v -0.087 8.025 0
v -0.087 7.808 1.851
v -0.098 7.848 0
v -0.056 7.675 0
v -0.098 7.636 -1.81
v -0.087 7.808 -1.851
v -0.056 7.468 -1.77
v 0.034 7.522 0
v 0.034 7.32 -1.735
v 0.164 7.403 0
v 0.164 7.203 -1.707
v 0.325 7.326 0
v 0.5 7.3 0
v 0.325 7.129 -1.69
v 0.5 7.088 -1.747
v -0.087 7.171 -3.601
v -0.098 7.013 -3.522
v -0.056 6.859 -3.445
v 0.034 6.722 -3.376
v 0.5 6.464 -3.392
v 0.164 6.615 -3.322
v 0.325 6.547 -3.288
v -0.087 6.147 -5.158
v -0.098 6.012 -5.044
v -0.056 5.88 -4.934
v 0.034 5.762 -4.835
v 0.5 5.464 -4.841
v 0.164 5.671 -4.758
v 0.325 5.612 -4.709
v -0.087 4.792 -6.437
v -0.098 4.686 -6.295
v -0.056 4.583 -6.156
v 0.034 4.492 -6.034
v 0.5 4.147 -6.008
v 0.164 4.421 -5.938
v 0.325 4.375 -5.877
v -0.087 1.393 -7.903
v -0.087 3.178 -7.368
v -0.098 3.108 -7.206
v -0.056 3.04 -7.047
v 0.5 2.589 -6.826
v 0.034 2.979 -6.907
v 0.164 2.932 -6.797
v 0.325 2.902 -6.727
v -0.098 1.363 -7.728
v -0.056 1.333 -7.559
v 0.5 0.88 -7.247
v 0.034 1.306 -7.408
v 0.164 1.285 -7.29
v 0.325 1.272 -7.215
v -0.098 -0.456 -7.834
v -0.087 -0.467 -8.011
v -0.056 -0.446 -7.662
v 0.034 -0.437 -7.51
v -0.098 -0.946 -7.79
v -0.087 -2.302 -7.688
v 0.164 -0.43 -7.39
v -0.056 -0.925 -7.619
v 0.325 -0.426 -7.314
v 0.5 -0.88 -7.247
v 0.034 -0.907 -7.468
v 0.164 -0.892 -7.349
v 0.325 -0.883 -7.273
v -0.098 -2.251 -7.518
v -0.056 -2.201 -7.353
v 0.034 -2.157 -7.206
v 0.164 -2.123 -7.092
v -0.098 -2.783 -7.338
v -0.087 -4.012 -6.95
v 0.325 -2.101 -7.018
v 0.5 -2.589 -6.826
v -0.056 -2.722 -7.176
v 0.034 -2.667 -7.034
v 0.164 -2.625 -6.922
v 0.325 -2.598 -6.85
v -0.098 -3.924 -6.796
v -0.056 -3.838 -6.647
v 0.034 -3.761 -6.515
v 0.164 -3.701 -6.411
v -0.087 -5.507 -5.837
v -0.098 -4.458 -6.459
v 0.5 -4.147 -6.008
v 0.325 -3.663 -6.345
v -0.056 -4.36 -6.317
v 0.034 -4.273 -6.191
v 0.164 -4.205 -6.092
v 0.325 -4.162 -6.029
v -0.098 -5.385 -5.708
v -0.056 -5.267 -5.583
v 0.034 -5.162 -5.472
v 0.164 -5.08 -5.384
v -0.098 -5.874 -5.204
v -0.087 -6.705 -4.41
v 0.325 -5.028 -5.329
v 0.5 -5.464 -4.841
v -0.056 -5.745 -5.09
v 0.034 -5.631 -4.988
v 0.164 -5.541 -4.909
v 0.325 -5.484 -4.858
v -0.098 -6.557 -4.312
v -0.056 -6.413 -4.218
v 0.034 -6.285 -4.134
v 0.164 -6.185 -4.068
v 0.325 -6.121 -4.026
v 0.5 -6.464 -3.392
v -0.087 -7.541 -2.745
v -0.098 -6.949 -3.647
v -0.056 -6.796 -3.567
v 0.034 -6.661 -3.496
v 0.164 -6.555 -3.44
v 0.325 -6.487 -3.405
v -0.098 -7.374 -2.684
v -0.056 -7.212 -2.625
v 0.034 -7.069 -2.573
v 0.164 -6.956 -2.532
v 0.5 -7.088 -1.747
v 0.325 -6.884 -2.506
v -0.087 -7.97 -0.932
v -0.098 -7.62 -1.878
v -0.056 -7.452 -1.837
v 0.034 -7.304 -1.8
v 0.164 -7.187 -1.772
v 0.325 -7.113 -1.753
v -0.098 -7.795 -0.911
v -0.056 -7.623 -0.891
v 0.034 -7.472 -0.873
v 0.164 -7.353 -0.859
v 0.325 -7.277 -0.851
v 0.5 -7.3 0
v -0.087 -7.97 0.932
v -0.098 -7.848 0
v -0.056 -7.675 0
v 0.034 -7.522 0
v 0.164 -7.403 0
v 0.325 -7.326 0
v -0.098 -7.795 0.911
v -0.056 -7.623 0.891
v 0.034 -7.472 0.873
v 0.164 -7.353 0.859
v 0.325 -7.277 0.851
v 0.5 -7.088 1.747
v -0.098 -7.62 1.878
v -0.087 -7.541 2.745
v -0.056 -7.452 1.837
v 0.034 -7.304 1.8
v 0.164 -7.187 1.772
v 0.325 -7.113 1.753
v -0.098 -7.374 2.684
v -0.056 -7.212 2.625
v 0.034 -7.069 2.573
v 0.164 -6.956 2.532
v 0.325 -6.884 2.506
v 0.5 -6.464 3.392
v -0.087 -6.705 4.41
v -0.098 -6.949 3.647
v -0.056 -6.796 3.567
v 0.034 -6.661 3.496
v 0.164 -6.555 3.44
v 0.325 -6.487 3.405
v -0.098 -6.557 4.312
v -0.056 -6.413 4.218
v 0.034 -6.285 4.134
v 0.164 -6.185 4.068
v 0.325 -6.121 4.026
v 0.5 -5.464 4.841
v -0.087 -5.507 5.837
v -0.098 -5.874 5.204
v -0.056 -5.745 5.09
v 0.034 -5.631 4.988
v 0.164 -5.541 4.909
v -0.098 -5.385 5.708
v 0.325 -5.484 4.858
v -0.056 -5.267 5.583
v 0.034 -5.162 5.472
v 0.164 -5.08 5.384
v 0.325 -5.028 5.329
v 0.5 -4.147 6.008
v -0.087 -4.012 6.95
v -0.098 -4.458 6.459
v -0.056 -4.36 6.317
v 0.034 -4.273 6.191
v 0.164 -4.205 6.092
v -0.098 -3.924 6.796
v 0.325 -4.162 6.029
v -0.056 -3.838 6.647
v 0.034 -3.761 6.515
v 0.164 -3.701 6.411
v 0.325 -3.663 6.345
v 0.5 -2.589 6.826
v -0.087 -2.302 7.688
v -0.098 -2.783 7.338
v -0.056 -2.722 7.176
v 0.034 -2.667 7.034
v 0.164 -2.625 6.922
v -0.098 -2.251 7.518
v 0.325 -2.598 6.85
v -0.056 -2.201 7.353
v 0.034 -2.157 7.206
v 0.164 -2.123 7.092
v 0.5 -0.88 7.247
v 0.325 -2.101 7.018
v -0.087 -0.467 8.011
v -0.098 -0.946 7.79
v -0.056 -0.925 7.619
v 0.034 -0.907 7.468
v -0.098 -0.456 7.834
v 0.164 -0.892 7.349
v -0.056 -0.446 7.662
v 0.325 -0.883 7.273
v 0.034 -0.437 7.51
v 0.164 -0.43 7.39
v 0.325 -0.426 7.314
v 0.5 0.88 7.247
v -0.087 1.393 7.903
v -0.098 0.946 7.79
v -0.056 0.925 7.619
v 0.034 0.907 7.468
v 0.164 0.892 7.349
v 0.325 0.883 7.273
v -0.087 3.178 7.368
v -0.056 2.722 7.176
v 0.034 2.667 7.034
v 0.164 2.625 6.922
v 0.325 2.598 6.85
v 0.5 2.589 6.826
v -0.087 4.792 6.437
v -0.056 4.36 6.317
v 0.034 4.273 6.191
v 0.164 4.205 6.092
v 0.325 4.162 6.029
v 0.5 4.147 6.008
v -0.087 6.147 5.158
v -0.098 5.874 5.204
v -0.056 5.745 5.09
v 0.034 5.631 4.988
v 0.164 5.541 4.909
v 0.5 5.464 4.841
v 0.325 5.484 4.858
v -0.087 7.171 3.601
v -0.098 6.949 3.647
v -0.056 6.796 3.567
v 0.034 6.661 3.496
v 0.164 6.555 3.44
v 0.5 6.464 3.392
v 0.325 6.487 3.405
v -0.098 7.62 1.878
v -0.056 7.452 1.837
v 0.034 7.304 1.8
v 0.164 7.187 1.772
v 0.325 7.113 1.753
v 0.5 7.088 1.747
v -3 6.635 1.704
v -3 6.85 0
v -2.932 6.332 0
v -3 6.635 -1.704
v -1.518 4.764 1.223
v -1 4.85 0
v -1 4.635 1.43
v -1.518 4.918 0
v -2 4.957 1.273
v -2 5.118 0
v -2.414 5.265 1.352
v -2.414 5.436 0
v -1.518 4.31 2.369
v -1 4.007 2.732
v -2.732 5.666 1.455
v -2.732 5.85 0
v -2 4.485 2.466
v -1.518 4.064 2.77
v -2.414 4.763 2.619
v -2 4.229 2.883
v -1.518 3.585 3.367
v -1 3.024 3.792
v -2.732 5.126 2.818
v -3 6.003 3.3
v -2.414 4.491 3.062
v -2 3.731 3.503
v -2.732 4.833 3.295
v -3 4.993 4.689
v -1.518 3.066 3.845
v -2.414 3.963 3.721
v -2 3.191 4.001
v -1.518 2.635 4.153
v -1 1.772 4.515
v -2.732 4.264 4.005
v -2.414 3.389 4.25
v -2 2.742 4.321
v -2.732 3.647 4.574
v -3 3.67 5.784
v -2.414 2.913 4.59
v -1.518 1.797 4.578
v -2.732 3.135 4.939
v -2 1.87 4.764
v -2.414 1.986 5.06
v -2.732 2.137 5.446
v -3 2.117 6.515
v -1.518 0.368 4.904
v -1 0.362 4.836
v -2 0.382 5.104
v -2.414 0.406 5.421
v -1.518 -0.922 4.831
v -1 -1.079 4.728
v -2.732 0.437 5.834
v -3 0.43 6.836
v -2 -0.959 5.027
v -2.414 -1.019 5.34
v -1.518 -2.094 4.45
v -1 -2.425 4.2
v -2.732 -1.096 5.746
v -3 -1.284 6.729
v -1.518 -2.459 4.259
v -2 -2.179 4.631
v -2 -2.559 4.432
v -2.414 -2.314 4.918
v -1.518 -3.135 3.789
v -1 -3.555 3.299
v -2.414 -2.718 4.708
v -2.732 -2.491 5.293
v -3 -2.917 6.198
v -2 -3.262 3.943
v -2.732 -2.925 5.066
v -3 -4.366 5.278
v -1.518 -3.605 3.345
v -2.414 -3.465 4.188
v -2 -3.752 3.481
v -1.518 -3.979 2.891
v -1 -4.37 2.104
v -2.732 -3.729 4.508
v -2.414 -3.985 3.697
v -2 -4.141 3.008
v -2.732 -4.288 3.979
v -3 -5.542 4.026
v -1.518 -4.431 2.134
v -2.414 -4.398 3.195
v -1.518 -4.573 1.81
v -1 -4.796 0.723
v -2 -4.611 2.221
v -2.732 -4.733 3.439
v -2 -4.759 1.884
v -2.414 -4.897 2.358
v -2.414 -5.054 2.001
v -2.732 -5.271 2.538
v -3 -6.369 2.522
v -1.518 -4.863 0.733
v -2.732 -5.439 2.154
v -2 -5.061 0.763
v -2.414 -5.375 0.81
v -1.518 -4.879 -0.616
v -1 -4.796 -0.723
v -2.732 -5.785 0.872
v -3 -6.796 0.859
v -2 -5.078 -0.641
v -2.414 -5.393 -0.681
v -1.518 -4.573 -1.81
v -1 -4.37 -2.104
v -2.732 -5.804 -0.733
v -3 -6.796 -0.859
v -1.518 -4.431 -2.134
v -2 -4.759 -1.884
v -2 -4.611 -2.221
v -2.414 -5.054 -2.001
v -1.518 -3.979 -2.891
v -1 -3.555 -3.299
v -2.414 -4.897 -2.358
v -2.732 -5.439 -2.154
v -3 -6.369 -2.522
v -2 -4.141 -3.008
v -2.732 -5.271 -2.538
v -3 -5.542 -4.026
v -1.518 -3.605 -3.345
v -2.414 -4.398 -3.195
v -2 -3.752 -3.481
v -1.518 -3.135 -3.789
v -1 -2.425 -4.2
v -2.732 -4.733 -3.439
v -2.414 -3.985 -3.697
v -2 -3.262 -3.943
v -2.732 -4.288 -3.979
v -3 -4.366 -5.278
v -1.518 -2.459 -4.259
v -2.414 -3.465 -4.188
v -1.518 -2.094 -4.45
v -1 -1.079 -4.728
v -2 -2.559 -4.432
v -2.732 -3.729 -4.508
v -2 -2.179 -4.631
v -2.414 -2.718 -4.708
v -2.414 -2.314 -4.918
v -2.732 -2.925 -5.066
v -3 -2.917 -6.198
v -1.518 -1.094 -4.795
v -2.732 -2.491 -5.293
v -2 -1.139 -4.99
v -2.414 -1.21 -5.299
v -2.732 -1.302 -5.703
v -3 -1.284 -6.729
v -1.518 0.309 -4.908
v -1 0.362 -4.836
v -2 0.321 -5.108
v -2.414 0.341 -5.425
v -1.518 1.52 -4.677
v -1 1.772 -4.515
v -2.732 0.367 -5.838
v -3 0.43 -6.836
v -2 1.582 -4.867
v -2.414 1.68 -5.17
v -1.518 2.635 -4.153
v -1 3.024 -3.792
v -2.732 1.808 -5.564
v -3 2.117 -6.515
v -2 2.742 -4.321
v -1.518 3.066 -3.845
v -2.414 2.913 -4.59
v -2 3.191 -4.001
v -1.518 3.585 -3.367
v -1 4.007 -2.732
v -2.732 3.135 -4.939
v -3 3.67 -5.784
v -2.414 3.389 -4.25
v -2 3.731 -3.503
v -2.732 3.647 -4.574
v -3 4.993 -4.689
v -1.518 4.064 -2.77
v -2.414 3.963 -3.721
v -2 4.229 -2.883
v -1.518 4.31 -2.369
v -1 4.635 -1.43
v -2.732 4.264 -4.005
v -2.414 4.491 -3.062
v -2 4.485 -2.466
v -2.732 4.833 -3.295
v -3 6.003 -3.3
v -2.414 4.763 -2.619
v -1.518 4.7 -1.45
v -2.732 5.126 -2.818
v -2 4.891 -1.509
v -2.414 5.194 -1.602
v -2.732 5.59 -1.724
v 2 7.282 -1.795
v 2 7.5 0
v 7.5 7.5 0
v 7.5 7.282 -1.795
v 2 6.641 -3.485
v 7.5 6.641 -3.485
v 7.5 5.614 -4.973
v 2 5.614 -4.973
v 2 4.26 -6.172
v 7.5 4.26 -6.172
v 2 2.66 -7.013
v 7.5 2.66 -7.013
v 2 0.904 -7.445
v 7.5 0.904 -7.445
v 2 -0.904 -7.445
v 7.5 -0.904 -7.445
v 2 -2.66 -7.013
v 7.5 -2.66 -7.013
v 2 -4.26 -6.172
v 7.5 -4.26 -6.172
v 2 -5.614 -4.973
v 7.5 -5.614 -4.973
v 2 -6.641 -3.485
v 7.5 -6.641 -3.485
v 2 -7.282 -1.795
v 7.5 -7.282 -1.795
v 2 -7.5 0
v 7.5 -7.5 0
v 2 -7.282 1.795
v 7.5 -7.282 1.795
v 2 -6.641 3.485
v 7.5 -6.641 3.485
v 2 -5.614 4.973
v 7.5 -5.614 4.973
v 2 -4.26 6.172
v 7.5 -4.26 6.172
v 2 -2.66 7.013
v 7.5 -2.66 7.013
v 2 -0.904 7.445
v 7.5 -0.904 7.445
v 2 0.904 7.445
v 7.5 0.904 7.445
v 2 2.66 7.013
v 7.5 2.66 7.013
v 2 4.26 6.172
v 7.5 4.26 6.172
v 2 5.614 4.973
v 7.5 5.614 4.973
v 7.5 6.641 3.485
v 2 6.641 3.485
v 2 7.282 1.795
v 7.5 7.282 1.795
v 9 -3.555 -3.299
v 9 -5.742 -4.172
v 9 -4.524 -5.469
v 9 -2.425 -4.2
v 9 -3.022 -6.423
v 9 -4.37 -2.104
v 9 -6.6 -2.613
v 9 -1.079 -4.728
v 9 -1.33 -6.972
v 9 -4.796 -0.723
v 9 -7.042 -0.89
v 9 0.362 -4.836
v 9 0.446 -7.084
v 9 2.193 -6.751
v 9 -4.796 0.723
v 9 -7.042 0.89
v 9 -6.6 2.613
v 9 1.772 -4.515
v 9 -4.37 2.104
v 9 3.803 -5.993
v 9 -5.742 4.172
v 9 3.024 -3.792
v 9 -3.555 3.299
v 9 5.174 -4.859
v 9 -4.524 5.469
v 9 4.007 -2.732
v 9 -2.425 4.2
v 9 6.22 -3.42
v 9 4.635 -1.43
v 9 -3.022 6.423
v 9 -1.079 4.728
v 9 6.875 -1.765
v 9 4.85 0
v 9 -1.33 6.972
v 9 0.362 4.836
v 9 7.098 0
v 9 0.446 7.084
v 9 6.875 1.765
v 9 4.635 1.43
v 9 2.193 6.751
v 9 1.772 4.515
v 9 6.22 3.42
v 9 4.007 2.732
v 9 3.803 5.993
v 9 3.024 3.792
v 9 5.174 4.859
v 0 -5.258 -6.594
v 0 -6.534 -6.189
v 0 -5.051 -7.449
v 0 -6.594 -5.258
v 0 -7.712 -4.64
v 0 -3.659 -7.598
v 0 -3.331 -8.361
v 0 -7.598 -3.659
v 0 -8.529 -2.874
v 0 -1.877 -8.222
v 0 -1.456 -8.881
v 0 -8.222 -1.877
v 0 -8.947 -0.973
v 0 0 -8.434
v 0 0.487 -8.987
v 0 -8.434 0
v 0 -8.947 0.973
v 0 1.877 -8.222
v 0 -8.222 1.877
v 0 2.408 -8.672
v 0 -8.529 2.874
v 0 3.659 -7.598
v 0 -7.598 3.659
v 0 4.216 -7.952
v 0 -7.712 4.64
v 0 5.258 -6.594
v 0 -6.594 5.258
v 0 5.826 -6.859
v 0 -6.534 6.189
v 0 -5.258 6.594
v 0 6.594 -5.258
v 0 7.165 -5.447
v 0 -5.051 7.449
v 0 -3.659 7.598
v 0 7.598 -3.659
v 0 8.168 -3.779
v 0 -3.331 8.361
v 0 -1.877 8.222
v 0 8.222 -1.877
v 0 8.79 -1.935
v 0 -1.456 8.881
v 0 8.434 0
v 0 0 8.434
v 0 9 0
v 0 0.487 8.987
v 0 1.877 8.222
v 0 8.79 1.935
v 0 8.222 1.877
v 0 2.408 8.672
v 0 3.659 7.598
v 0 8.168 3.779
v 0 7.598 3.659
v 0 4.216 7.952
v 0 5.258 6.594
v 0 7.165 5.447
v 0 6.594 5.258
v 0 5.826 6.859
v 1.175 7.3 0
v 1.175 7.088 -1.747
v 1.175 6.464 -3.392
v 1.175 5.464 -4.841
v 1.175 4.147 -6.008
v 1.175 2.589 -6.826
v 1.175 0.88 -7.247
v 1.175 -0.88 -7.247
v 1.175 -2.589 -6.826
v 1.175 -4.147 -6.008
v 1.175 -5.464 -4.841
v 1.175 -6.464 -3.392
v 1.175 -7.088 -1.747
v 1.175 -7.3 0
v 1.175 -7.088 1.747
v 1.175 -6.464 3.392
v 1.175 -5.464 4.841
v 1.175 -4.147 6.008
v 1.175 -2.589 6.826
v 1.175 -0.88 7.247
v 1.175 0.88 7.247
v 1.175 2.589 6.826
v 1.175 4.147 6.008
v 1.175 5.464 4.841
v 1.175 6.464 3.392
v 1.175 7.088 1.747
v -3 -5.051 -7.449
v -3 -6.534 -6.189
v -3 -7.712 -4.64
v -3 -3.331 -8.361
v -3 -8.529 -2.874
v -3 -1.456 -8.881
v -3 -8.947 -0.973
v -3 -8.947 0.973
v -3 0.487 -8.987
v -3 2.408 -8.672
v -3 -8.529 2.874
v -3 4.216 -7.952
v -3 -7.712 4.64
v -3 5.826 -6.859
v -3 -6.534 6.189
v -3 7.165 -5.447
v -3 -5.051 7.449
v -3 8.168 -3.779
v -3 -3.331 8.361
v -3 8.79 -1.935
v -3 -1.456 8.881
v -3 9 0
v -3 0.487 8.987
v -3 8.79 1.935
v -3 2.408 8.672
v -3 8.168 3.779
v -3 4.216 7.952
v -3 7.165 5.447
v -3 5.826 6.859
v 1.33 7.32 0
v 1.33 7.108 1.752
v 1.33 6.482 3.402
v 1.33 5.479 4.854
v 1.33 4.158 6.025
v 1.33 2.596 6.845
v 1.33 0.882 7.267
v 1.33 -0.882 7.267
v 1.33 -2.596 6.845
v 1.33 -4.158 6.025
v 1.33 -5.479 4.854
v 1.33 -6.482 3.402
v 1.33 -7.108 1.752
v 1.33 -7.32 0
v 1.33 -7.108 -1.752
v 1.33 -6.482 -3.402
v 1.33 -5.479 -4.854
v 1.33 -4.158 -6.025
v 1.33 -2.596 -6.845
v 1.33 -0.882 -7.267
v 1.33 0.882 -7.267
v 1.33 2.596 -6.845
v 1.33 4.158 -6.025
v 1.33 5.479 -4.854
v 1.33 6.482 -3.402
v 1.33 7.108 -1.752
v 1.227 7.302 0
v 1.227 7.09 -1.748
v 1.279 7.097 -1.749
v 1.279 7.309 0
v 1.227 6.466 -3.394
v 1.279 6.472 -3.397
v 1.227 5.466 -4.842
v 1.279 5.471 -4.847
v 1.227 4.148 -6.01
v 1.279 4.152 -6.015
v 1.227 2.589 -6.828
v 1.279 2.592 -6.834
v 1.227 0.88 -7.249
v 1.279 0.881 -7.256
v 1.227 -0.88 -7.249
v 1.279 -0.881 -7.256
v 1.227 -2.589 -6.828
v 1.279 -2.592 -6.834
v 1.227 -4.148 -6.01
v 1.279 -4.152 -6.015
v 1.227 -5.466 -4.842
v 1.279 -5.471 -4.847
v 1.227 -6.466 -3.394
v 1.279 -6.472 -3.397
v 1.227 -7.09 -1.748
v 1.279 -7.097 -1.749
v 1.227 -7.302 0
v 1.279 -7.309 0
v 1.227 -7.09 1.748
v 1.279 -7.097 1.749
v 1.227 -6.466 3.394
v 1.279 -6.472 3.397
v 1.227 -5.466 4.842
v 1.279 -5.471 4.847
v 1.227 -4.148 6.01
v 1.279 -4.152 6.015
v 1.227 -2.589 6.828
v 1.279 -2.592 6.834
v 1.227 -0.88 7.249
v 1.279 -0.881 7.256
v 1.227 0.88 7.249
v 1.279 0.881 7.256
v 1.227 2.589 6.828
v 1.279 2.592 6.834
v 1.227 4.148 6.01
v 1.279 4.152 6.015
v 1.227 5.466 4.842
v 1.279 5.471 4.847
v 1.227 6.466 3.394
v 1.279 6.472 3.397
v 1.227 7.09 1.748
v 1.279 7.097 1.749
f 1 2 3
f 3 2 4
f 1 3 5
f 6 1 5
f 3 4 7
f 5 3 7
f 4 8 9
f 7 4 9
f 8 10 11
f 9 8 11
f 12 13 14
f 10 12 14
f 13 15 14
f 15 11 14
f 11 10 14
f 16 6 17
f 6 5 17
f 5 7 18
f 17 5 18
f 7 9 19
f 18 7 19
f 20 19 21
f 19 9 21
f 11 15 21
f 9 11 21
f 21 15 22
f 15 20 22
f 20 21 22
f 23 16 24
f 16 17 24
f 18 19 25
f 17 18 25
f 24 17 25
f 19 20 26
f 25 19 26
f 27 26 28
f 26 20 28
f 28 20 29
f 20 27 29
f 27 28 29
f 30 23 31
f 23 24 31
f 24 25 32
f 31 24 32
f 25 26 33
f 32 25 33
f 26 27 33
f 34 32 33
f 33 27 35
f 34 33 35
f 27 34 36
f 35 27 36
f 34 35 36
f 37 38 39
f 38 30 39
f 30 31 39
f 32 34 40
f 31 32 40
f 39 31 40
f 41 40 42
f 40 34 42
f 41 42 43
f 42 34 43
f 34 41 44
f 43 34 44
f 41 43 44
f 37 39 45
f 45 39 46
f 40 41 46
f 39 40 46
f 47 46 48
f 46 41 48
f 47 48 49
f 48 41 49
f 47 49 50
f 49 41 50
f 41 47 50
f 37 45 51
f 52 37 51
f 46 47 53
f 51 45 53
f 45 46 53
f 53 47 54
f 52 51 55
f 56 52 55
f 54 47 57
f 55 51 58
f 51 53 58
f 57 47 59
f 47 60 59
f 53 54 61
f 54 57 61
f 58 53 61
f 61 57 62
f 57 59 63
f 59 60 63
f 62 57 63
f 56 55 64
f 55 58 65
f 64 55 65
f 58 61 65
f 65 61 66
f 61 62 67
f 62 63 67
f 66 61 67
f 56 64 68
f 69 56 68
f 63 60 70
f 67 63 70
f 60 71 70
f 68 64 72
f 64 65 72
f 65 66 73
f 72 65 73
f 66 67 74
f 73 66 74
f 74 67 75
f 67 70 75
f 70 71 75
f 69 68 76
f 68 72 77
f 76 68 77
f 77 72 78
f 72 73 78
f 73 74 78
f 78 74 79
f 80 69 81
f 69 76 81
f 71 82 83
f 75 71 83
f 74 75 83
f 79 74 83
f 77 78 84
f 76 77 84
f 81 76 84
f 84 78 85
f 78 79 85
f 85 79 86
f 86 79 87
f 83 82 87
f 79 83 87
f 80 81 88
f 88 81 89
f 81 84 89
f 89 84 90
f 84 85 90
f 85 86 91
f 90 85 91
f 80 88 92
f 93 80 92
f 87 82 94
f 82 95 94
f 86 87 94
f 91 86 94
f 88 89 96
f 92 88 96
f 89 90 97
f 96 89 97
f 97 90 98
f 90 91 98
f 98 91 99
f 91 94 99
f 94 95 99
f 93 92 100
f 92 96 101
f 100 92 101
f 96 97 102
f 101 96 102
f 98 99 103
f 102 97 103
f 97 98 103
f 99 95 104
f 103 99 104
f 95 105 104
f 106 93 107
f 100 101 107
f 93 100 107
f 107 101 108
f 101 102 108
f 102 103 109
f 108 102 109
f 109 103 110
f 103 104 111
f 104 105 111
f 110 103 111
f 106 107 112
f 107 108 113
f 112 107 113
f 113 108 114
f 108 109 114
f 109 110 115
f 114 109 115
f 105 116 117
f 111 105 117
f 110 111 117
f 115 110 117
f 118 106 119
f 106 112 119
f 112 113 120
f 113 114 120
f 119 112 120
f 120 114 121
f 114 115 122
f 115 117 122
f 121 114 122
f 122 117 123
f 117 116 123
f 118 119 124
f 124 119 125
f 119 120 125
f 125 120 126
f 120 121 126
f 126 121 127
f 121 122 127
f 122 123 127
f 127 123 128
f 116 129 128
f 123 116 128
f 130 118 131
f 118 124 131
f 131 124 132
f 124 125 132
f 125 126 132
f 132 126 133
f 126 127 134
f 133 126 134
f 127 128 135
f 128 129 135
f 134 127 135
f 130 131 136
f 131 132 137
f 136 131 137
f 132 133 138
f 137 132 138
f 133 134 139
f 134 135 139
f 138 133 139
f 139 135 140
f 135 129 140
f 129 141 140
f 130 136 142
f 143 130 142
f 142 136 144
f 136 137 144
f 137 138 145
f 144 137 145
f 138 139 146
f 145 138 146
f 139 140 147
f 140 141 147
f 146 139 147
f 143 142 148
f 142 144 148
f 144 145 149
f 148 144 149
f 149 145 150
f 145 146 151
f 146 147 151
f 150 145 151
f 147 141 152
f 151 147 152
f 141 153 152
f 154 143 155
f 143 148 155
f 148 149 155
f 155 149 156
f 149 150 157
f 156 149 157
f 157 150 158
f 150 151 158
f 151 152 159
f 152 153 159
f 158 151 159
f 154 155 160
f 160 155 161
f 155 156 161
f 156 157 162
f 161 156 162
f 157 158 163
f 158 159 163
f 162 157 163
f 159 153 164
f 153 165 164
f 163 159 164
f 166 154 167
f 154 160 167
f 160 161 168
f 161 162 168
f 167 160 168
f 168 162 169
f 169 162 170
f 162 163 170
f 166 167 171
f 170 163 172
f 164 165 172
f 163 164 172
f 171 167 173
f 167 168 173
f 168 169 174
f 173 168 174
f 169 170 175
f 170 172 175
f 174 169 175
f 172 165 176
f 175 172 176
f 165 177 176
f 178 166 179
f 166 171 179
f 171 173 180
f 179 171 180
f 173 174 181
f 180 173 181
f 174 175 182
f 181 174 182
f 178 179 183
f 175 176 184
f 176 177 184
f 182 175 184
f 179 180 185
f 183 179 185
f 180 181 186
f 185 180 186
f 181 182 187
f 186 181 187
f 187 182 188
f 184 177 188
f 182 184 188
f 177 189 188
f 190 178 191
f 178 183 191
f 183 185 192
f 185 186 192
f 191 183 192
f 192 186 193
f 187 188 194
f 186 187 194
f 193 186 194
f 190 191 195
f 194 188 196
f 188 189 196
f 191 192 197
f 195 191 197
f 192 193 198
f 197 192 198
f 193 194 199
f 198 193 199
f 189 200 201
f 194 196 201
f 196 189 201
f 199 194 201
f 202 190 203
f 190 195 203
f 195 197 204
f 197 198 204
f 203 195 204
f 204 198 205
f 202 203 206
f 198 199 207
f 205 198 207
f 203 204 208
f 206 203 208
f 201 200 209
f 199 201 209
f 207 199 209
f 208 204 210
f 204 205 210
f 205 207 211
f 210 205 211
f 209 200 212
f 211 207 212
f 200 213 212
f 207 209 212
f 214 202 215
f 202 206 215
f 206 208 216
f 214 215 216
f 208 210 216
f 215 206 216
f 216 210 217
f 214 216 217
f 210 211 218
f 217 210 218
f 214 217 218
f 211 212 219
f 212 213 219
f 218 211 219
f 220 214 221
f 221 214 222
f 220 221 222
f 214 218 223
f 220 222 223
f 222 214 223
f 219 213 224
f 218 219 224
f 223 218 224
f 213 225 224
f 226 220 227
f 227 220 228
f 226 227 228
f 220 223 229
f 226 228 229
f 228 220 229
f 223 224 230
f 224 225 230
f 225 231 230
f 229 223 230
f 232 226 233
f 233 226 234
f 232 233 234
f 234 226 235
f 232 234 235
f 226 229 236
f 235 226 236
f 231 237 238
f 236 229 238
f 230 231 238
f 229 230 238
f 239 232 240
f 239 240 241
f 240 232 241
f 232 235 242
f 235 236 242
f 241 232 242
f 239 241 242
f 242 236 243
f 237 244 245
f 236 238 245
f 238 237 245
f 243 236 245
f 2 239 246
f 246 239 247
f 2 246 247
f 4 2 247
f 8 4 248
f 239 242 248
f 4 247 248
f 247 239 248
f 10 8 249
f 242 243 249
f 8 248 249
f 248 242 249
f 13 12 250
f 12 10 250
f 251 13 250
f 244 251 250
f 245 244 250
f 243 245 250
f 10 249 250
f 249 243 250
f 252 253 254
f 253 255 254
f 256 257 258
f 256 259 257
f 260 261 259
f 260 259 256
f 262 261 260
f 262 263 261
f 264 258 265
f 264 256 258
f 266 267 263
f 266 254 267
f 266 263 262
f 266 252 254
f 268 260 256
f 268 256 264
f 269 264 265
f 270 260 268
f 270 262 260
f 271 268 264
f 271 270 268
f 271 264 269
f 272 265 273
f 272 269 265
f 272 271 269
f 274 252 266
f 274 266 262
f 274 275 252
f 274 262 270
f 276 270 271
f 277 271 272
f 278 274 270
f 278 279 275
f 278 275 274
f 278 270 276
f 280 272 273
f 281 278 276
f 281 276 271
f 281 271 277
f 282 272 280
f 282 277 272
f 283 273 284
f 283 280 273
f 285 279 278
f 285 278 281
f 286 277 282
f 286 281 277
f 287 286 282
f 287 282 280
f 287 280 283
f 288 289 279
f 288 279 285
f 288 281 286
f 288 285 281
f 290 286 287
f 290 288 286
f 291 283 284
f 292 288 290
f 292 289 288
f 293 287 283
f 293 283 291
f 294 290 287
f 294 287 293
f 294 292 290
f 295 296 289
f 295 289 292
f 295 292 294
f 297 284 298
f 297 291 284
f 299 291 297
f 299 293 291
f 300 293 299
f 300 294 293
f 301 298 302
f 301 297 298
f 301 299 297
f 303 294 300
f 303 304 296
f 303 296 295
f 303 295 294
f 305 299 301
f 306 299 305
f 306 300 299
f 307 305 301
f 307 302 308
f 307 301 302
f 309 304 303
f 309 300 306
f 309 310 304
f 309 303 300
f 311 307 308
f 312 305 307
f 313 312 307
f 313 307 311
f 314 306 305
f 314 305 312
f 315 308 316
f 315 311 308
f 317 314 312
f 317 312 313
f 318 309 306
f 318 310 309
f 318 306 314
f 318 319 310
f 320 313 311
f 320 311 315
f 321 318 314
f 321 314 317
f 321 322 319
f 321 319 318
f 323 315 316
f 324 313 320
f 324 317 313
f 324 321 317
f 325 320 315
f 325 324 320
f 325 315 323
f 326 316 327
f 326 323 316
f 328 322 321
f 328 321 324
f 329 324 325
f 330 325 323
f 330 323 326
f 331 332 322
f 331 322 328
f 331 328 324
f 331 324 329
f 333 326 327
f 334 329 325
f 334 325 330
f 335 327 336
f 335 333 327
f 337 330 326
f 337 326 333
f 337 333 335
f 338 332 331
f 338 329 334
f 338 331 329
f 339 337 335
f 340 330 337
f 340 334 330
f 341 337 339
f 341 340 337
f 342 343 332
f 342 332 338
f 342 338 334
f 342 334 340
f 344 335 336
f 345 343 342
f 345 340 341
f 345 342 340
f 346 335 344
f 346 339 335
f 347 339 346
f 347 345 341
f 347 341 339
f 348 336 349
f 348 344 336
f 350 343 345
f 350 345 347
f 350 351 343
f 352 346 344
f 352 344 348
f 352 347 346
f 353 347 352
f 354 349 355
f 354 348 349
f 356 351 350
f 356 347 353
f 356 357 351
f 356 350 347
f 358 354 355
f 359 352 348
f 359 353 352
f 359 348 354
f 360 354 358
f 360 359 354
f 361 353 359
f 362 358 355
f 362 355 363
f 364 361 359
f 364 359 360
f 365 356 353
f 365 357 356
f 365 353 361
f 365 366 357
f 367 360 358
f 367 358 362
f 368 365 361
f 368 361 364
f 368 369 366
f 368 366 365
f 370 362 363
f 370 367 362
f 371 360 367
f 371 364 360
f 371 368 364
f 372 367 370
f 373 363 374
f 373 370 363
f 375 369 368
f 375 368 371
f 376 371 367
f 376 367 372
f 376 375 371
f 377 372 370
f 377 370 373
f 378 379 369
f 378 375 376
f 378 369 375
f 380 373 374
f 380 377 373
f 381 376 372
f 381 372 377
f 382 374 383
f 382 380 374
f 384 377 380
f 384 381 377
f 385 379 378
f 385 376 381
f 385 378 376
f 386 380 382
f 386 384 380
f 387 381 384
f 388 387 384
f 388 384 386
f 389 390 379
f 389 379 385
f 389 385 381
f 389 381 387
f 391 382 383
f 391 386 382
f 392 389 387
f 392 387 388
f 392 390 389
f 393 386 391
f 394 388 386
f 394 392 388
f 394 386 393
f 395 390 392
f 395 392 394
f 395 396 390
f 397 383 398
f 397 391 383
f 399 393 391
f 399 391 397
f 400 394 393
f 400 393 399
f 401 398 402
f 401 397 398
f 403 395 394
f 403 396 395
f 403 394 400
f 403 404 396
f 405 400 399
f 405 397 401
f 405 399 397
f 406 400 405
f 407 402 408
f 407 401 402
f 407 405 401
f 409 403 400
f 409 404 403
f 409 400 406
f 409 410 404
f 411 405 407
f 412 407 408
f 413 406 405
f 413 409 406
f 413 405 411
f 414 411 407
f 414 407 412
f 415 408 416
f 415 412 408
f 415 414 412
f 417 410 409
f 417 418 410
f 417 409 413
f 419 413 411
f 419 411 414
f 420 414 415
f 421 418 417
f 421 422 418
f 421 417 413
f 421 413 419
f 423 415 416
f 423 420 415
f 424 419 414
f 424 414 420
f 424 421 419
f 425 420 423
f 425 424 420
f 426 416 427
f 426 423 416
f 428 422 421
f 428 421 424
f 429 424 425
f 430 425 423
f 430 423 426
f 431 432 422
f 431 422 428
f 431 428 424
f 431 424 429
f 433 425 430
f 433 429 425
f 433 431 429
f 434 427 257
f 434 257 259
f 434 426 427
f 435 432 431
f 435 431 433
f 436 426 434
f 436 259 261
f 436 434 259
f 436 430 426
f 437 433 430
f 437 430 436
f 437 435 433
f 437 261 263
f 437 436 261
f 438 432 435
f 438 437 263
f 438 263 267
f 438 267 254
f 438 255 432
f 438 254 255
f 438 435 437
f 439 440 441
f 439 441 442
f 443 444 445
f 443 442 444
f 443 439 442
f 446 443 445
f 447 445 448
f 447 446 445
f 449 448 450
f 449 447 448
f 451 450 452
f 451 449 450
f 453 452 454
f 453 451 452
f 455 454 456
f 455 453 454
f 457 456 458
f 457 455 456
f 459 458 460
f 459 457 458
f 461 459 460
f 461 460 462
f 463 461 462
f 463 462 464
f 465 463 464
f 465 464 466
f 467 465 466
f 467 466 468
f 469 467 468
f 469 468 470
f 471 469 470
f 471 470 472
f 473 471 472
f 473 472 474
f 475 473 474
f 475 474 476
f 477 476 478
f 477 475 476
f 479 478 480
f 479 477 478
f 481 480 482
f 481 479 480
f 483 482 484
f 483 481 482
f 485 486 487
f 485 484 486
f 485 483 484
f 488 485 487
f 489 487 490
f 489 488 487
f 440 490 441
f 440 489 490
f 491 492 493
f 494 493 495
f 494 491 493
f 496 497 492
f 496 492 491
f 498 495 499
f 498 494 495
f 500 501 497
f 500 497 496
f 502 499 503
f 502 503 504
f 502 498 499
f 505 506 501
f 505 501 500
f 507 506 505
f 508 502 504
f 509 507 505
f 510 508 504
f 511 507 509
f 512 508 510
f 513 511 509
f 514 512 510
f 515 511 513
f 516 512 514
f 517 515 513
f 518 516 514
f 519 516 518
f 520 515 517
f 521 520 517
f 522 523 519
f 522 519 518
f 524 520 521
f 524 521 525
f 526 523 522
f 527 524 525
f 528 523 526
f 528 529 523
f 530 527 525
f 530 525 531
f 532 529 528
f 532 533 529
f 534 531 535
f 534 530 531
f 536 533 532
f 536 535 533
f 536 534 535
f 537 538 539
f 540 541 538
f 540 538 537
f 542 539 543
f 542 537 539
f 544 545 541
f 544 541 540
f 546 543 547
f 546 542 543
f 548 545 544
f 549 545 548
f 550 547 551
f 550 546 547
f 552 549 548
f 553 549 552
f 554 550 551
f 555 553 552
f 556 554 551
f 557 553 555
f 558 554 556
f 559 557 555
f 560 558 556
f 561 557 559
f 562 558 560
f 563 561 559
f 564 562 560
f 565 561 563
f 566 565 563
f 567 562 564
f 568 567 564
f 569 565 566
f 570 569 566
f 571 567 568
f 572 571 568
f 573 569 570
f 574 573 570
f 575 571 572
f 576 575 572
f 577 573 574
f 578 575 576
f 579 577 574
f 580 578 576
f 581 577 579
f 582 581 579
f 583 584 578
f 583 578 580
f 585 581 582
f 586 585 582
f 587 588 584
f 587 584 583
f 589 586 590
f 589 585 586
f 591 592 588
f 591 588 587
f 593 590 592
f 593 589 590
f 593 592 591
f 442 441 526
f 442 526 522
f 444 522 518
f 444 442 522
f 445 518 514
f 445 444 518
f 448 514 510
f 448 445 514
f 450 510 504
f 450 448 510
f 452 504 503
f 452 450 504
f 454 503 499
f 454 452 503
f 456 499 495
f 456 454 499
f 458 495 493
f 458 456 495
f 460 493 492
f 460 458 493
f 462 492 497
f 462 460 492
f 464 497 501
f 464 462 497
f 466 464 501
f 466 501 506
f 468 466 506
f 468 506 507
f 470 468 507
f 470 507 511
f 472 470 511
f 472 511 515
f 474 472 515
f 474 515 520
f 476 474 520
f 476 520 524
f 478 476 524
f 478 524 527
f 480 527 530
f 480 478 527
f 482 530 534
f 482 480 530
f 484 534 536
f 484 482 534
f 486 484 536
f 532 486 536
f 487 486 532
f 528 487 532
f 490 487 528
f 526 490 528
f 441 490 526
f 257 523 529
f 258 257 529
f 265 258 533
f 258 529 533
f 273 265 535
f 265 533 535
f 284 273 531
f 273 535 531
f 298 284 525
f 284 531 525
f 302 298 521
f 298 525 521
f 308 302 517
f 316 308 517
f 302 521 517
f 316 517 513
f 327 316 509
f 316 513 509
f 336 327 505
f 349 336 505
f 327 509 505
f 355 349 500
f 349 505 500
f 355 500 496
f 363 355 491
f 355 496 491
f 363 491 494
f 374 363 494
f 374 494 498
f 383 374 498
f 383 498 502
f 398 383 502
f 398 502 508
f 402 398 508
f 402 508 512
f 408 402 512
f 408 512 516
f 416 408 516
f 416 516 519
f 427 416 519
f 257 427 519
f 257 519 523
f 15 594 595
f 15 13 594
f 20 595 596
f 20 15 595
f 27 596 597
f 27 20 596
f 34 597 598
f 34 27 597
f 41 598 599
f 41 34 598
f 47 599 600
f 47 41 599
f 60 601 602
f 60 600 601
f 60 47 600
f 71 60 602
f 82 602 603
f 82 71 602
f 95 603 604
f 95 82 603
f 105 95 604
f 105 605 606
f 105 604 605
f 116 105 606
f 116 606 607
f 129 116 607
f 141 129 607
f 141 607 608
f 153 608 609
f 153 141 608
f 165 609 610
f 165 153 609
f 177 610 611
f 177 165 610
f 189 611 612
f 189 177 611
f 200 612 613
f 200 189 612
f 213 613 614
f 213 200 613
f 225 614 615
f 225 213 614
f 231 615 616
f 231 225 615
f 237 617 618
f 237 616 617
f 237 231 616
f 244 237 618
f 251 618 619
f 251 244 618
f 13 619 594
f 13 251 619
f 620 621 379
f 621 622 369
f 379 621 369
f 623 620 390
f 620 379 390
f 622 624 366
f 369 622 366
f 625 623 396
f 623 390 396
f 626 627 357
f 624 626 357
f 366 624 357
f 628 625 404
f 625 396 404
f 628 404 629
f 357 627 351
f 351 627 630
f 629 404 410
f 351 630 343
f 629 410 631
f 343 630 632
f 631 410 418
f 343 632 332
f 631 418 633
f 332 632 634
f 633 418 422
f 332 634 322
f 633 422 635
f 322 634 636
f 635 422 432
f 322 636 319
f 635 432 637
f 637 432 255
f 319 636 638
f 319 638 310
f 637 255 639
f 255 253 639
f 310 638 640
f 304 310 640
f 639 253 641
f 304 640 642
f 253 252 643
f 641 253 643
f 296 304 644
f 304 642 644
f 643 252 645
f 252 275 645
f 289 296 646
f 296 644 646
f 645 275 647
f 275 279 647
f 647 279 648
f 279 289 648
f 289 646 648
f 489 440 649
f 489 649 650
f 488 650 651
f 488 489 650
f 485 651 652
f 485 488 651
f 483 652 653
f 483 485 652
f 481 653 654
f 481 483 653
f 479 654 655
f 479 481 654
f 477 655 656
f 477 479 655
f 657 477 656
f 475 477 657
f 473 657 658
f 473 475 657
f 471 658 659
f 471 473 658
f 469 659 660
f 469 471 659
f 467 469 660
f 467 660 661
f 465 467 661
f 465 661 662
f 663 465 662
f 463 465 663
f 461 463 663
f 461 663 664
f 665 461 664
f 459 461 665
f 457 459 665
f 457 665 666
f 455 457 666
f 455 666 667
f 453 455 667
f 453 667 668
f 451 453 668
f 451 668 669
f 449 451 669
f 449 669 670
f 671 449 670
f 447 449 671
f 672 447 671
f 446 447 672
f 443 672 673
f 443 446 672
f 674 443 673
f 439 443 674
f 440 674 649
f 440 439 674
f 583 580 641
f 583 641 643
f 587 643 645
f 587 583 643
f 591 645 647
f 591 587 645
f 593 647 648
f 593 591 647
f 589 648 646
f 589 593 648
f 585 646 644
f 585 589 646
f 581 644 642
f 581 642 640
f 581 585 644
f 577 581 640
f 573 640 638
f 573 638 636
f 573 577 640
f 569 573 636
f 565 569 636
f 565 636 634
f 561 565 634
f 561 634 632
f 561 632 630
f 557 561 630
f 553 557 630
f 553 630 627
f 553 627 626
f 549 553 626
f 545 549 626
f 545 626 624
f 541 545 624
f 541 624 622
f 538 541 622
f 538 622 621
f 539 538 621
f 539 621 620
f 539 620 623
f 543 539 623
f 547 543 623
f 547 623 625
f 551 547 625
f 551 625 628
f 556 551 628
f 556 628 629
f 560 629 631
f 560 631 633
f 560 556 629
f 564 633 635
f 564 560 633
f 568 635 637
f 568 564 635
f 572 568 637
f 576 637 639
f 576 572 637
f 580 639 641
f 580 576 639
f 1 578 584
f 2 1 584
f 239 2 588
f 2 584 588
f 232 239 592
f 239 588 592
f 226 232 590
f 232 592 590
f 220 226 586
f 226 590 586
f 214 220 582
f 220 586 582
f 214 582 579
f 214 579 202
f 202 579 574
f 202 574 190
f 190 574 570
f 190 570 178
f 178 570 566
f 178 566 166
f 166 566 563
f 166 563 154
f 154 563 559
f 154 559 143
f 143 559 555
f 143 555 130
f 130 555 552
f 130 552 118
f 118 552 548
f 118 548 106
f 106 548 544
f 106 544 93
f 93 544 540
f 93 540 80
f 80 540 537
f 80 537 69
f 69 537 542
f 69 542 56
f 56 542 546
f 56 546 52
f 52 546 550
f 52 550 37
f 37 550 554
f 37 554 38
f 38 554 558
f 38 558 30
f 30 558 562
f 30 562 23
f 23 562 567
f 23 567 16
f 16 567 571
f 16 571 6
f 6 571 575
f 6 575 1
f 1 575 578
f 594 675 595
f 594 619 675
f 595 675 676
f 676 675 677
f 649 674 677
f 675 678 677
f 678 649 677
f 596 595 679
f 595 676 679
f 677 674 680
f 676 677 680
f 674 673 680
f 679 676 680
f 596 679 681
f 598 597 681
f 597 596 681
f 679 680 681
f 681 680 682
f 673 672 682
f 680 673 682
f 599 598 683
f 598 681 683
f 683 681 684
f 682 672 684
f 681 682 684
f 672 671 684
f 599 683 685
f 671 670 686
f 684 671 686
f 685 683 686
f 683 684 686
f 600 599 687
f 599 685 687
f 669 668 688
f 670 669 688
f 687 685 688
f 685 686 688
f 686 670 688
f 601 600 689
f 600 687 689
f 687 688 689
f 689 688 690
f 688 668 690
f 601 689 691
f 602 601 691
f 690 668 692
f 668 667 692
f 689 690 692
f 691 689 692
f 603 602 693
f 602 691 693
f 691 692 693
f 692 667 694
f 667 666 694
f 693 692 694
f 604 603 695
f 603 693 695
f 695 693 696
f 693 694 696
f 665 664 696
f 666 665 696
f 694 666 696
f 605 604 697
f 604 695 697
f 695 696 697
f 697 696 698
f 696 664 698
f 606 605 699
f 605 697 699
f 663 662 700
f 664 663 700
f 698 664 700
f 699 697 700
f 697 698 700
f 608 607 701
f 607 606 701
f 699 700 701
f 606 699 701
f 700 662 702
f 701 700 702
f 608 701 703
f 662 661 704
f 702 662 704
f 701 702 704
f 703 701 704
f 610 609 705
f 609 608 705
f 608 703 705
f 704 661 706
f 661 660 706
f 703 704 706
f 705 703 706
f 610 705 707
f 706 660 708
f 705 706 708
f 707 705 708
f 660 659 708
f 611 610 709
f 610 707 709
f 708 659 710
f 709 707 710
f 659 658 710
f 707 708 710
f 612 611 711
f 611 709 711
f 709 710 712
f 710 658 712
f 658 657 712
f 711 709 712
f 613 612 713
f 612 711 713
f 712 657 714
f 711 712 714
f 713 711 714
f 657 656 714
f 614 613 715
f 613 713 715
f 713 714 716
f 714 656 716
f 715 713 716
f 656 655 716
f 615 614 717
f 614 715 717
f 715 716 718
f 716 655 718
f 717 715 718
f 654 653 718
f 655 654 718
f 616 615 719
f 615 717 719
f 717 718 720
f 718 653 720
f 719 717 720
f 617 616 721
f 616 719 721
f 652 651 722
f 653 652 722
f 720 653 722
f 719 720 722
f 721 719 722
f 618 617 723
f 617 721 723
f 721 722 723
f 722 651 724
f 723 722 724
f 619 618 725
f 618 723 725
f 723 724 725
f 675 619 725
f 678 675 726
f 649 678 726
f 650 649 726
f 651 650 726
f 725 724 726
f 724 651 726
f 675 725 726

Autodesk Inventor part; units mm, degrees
ref_plane "YZ Plane" through (0, 0, 0) normal (1, 0, 0) x (0, 1, 0)
ref_plane "XZ Plane" through (0, 0, 0) normal (0, 1, 0) x (-1, 0, 0)
ref_plane "XY Plane" through (0, 0, 0) normal (0, 0, 1) x (1, 0, 0)
sketch "Skizze1" plane through (0, 0, 0) normal (0, 0, 1) x (1, 0, 0)
  line L0 (-2.5, 0) -> (5.5, 0)
  line L1 (9, 4.85) -> (9, 7.5)
  line L2 (9, 7.5) -> (2, 7.5)
  line L3 (-3, 4.85) -> (-3, 9)
  line L4 (-3, 9) -> (0, 9)
  line L5 (2, 7.5) -> (1.3299, 7.3204)
  line L6 (1.1746, 7.3) -> (0.5, 7.3)
  line L7 (-0.0869, 8.0247) -> (0, 8.4335)
  line L8 (0, 8.4335) -> (0, 9)
  arc A0 (-0.0869, 8.0247) -> (0.5, 7.3) centre (0.5, 7.9) ccw
  arc A1 (1.1746, 7.3) -> (1.3299, 7.3204) centre (1.1746, 7.9) ccw
  line L9 (-28.4, 0) -> (128.4, 0) projected
  line L10 (0, -12) -> (0, 72) projected
  line L11 (-3, 4.85) -> (9, 4.85)
  dimension "d0" = 18
  dimension "d1" = 15
  dimension "d2" = 12
  dimension "d3" = 12
  dimension "d4" = 0.6
  dimension "d5" = 0.1
  dimension "d6" = 2
  dimension "d7" = 15
  dimension "d8" = 0.2
  dimension "d9" = 0.6
  dimension "d10" = 3
  dimension "d11" = 9.7
revolve "Körper" add sketch "Skizze1" angle 360 about axis through (-2.5, 0, 0) along (1, 0, 0) contours L11 L10 A0 L6 A1 L5 L2 L1 | L11 L3 L4 L8 L7 A0 L10
chamfer "Fase1" distance 1.5 angle 15 1 edges at (9, -7.5, 0) measured on face at (6.6667, 7.4029, -1.2031)
fillet "Rundung1" radius 2 1 edges at (-3, -4.85, 0)
equation "\"d12\" = PHH"
equation "\"d13\" = ANG"
equation "\"d29\" = PHH"
equation "\"d14\" = RR"
equation "\"d0\" = KOD"
equation "\"d1\" = SD2"
equation "\"d2\" = NLG"
equation "\"d4\" = FSRR"
equation "\"d5\" = FST2"
equation "\"d6\" = FSB"
equation "\"d8\" = FST1"
equation "\"d9\" = FSRR"
equation "\"d10\" = KOH"
equation "\"d11\" = NND"
equation "\"NLG\" = 12"
equation "\"NND\" = 9.7"
equation "\"KOD\" = 18"
equation "\"KOH\" = 3"
equation "\"SD2\" = 15"
equation "\"FST1\" = 0.2"
equation "\"FST2\" = 0.1"
equation "\"FSB\" = 2"
equation "\"FSRR\" = 0.6"
equation "\"PHH\" = 1.5"
equation "\"ANG\" = 15deg"
equation "\"RR\" = 2"
equation "\"NNDMIN\" = 8.1"
equation "\"FSH\" = 1.4"
equation "\"SEWI\" = 30deg"
properties part number "DIN 172 - A 9,7 x 12" material "Stahl, weich"
